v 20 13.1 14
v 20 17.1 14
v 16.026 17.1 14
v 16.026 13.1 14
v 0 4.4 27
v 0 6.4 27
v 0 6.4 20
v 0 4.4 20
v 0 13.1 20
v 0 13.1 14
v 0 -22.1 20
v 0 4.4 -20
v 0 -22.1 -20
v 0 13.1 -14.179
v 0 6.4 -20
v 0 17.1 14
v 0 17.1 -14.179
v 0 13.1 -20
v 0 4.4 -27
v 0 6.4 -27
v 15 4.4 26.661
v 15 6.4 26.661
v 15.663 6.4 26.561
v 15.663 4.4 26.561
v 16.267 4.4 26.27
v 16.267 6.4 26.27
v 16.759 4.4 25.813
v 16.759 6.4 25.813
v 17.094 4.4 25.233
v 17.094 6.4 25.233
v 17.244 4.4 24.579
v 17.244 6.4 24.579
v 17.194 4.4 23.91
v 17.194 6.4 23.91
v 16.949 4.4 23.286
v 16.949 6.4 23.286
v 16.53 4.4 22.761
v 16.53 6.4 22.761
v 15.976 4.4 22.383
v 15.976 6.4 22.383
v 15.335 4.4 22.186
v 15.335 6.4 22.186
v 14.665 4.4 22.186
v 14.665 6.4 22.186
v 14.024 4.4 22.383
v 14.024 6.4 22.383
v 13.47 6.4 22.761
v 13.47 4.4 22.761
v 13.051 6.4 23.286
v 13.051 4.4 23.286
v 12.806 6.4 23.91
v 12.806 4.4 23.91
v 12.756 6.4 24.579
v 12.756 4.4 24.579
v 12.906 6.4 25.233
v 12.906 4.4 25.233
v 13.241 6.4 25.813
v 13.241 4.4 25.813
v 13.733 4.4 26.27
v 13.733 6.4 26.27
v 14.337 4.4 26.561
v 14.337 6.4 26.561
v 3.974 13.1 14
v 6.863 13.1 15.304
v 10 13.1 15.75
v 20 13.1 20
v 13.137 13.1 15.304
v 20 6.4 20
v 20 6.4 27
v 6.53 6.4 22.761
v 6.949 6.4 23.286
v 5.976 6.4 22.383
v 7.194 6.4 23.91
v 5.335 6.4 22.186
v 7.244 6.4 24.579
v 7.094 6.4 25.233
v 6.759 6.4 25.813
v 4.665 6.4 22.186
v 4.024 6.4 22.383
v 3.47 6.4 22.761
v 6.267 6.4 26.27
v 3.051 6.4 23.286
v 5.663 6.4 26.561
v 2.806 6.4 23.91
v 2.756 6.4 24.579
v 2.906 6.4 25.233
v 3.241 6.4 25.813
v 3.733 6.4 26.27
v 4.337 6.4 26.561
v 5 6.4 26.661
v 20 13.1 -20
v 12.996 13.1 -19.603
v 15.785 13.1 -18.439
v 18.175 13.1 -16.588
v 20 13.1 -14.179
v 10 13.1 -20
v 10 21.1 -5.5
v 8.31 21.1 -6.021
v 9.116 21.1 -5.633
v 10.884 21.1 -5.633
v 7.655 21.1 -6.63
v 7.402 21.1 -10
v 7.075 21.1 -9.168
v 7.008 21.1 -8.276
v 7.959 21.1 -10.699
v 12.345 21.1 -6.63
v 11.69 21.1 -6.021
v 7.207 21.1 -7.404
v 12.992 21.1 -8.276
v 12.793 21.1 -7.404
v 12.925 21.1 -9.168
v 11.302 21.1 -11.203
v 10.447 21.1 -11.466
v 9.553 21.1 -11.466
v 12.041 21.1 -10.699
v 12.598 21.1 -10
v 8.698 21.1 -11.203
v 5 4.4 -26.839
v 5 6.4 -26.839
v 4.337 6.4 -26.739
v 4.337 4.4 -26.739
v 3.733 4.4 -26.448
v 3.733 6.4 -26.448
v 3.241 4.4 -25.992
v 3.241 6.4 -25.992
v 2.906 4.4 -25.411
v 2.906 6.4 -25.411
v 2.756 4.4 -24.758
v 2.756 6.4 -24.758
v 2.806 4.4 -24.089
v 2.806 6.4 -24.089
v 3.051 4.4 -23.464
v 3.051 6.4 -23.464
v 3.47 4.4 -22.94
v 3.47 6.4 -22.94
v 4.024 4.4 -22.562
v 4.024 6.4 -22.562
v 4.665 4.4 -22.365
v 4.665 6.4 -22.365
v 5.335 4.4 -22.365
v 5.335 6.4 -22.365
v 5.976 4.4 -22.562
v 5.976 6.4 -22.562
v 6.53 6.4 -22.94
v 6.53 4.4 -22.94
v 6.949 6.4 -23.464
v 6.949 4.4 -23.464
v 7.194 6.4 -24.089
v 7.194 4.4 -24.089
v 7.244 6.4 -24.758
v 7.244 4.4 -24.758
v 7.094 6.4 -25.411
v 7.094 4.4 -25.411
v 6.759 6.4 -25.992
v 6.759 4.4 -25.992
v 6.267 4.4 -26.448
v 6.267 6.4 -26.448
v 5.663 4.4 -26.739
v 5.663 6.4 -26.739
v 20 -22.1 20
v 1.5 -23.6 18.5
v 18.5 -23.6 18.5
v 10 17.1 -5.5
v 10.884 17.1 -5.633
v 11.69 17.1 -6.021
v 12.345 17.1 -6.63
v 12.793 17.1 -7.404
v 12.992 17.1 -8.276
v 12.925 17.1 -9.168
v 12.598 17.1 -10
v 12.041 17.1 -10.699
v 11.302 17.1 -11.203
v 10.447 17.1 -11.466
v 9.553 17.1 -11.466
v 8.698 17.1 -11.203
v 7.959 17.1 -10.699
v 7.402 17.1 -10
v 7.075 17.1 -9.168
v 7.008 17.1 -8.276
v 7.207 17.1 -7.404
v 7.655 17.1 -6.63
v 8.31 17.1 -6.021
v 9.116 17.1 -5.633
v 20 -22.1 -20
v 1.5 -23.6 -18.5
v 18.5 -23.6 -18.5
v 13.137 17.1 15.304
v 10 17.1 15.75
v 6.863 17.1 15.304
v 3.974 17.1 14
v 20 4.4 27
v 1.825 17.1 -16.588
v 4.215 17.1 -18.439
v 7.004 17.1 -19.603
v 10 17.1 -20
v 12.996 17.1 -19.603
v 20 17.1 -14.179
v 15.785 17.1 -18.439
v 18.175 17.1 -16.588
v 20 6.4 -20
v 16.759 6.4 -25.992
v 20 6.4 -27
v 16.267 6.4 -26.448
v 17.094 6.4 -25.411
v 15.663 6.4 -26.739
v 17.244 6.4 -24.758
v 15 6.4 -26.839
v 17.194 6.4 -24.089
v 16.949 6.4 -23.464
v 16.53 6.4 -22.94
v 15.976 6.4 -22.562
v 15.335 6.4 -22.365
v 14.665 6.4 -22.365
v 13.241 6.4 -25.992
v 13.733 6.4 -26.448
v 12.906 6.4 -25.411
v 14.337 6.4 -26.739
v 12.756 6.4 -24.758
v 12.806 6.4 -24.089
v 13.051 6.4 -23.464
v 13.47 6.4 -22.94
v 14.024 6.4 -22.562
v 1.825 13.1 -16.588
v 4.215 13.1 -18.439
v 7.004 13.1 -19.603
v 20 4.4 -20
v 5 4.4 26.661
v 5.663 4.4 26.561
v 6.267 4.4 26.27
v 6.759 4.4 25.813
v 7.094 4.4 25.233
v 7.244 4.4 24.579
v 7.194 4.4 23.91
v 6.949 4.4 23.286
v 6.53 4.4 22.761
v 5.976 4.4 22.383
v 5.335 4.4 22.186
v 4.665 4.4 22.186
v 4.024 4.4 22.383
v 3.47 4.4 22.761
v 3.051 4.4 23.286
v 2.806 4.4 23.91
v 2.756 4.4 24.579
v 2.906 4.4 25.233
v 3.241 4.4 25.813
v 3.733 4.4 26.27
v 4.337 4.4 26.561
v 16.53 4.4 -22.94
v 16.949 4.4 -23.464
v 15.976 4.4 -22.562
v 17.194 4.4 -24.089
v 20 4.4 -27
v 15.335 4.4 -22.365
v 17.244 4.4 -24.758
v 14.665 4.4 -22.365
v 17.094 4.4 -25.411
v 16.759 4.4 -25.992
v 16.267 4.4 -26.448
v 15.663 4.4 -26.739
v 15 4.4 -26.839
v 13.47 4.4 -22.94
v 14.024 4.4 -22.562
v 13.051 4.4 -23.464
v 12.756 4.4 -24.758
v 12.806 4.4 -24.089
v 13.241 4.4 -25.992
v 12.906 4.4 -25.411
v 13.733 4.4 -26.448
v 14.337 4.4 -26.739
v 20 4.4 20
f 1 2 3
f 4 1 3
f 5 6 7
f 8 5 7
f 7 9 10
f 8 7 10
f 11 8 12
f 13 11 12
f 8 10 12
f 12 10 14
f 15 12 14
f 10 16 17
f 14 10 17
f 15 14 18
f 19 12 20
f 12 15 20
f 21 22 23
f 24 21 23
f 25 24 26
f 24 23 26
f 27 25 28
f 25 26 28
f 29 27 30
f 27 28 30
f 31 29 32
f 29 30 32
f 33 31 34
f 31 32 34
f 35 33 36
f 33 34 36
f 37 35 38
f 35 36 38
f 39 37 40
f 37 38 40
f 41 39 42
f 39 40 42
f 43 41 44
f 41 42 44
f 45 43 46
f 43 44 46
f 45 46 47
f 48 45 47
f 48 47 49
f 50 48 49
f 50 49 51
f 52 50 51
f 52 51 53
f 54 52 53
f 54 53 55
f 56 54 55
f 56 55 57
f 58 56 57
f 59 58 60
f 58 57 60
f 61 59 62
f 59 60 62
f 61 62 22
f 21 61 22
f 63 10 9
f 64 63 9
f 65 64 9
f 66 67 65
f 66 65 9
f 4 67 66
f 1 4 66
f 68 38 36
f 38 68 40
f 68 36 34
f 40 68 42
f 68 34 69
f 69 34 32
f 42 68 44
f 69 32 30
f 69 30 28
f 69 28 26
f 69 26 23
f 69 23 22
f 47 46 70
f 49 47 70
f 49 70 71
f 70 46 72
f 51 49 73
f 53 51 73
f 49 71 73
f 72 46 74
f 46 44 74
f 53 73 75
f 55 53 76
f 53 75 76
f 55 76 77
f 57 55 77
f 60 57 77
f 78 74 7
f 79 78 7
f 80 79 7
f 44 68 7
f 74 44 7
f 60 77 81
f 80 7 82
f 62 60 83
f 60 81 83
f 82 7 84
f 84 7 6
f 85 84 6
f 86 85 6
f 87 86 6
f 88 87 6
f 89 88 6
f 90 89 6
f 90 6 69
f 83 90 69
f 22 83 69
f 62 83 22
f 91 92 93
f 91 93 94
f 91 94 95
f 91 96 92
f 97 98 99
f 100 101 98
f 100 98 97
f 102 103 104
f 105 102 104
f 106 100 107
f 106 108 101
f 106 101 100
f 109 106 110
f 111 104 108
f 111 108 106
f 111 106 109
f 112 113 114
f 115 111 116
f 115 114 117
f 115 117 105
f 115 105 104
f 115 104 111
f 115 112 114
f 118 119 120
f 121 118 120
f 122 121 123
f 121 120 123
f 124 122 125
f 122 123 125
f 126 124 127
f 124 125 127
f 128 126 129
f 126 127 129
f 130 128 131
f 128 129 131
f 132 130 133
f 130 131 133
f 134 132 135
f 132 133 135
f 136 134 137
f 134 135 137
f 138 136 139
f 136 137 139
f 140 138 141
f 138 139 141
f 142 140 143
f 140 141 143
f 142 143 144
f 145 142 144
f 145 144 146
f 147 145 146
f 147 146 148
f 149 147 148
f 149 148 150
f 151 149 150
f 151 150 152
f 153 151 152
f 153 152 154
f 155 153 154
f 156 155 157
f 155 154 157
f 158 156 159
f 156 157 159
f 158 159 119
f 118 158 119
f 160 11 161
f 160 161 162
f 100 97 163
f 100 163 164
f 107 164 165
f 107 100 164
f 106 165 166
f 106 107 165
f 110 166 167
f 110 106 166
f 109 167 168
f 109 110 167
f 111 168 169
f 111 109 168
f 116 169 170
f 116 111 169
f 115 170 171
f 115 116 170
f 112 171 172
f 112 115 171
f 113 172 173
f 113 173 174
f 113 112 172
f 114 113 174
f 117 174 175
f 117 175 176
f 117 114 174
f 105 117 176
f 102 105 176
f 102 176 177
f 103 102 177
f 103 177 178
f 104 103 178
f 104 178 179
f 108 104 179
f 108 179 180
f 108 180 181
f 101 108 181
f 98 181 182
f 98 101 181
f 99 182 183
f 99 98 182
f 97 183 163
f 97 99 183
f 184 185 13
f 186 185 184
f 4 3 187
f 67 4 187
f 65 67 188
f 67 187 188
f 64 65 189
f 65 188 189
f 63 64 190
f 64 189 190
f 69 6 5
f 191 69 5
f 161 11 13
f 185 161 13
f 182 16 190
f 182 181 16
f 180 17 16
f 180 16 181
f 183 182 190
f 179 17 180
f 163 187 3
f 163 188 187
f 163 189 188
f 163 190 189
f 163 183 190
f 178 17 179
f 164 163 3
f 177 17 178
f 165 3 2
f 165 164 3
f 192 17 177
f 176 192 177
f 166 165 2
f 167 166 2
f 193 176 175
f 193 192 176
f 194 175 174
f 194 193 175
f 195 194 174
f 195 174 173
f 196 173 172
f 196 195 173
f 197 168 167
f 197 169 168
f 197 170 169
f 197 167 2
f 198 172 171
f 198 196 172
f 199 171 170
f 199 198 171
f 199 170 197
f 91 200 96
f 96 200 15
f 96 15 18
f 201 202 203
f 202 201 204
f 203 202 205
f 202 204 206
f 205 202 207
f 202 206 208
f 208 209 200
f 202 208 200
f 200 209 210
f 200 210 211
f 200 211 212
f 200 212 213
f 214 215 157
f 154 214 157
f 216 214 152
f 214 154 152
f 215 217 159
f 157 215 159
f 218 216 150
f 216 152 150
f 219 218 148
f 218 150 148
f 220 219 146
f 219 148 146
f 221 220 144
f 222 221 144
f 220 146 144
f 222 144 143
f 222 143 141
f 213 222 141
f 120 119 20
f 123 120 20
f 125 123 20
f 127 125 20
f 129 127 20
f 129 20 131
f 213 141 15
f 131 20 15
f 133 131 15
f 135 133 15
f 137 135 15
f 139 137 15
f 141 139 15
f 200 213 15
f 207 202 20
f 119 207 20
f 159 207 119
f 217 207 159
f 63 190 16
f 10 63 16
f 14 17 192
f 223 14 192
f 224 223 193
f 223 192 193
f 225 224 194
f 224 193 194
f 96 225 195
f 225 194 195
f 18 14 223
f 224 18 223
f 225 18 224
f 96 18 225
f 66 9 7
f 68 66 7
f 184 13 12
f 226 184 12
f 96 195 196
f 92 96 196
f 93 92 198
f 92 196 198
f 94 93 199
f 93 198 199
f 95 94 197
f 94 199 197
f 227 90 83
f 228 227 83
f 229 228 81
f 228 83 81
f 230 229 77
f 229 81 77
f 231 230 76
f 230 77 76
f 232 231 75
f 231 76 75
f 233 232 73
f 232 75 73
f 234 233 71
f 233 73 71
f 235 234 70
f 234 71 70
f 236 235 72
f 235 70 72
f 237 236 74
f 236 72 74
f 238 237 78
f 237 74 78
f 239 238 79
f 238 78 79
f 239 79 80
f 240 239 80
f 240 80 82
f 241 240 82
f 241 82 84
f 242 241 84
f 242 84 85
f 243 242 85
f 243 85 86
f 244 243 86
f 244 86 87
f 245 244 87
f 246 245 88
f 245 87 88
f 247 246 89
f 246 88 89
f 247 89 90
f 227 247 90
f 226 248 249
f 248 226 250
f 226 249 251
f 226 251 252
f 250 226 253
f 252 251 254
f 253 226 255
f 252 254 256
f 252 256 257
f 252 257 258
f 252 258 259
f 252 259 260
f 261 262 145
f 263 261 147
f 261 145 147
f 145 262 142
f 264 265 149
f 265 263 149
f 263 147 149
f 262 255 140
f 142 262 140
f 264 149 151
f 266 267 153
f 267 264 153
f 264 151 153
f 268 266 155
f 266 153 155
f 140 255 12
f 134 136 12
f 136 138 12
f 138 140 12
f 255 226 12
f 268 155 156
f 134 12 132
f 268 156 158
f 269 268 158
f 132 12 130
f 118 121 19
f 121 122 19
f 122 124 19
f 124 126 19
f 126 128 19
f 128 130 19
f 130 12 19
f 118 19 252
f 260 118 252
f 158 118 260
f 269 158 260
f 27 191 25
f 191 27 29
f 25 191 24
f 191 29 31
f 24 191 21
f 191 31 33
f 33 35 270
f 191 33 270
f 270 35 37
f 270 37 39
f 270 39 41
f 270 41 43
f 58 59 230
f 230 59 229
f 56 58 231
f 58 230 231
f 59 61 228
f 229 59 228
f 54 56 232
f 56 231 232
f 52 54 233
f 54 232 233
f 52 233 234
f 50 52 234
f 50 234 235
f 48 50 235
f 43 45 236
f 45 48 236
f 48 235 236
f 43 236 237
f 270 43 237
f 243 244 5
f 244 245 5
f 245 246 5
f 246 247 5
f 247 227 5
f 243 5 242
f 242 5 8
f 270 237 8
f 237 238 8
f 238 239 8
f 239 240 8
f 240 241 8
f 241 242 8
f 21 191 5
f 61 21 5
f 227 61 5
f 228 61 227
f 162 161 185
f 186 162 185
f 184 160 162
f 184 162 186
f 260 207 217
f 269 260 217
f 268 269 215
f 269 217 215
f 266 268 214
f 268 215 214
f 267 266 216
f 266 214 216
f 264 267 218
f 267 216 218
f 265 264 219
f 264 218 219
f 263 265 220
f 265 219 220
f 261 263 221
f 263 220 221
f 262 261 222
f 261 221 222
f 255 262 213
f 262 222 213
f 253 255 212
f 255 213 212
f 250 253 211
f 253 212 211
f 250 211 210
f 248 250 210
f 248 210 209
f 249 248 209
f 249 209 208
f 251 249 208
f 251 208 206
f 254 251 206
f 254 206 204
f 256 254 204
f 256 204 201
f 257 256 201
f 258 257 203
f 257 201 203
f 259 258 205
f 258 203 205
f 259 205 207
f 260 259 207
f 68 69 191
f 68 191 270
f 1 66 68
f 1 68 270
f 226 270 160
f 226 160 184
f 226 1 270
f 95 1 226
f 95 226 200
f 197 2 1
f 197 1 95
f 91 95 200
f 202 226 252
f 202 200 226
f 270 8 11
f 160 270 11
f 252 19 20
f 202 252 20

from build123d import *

# Parameters (mm, degrees)
BOSS_EXTRUDE1_DEPTH = 20
SKETCH2_W           = 20
SKETCH2_H           = 40
CUT_EXTRUDE1_DEPTH  = 2.5
SKETCH3_W           = 20
SKETCH3_H           = 40
SKETCH3_R           = 3
CUT_EXTRUDE2_DEPTH  = 4
CUT_EXTRUDE3_DEPTH  = 4
SKETCH5_R           = 2.25
CUT_EXTRUDE4_DEPTH  = 2
CHAMFER1_SIZE       = 1.5


with BuildPart() as part:
    # Sketch1 → Boss-Extrude1 (new body)
    with BuildSketch(Plane(origin=(0, 0, 0), x_dir=(0, 0, -1), z_dir=(1, 0, 0))):
        Polygon((0, -23.6), (20, -23.6), (20, 4.4), (27, 4.4), (27, 6.4), (20, 6.4), (20, 12.4), (20, 23.6), (-20, 23.6), (-20, 12.4), (-20, 6.4), (-27, 6.4), (-27, 4.4), (-20, 4.4), (-20, -23.6), align=None)
    extrude(amount=BOSS_EXTRUDE1_DEPTH)

    # Sketch2 → Cut-Extrude1 (cut)
    with BuildSketch(Plane(origin=(0, 23.6, 0), x_dir=(1, 0, 0), z_dir=(0, 1, 0))):
        with Locations((10, 0)):
            Rectangle(SKETCH2_W, SKETCH2_H)
    extrude(amount=-CUT_EXTRUDE1_DEPTH, mode=Mode.SUBTRACT)

    # Sketch3 → Cut-Extrude2 (cut)
    with BuildSketch(Plane(origin=(0, 21.1, 0), x_dir=(1, 0, 0), z_dir=(0, 1, 0))):
        with Locations((10, 0)):
            Rectangle(SKETCH3_W, SKETCH3_H)
        with Locations(Location((10, 8.5, 0), (0, 0, 270))):
            Circle(SKETCH3_R, mode=Mode.SUBTRACT)
    extrude(amount=-CUT_EXTRUDE2_DEPTH, mode=Mode.SUBTRACT)

    # Sketch4 → Cut-Extrude3 (cut)
    with BuildSketch(Plane(origin=(0, 17.1, 0), x_dir=(1, 0, 0), z_dir=(0, 1, 0))):
        with BuildLine():
            Line((10.000000061, 20), (0, 20))
            Line((0, 20), (0, 14.178908346))
            ThreePointArc((0, 14.178908346), (4.214563395, 18.438748578), (10.000000061, 20))
        make_face()
        with BuildLine():
            Line((20, 20), (10.000000061, 20))
            ThreePointArc((10.000000061, 20), (15.785436657, 18.438748547), (20, 14.178908346))
            Line((20, 14.178908346), (20, 20))
        make_face()
        with BuildLine():
            Line((3.974014603, -14), (0, -14))
            Line((0, -14), (0, -20))
            Line((0, -20), (20, -20))
            Line((20, -20), (20, -14))
            Line((20, -14), (16.025985397, -14))
            ThreePointArc((16.025985397, -14), (10, -15.75), (3.974014603, -14))
        make_face()
    extrude(amount=-CUT_EXTRUDE3_DEPTH, mode=Mode.SUBTRACT)

    # Sketch5 → Cut-Extrude4 (cut)
    with BuildSketch(Plane(origin=(0, 6.4, 0), x_dir=(1, 0, 0), z_dir=(0, 1, 0))):
        with Locations(Location((5, -24.410545827, 0), (0, 0, 270))):
            Circle(SKETCH5_R)
        with Locations(Location((15, -24.410545827, 0), (0, 0, 270))):
            Circle(SKETCH5_R)
        with Locations(Location((15, 24.589454173, 0), (0, 0, 90))):
            Circle(SKETCH5_R)
        with Locations(Location((5, 24.589454173, 0), (0, 0, 90))):
            Circle(SKETCH5_R)
    extrude(amount=-CUT_EXTRUDE4_DEPTH, mode=Mode.SUBTRACT)

    # Chamfer1
    chamfer1_edges = [part.edges().sort_by_distance(p)[0] for p in [
        (0, -23.6, 0),
        (10, -23.6, 20),
        (10, -23.6, -20),
        (20, -23.6, 0),
    ]]
    chamfer(chamfer1_edges, length=CHAMFER1_SIZE)


solid = part.part
